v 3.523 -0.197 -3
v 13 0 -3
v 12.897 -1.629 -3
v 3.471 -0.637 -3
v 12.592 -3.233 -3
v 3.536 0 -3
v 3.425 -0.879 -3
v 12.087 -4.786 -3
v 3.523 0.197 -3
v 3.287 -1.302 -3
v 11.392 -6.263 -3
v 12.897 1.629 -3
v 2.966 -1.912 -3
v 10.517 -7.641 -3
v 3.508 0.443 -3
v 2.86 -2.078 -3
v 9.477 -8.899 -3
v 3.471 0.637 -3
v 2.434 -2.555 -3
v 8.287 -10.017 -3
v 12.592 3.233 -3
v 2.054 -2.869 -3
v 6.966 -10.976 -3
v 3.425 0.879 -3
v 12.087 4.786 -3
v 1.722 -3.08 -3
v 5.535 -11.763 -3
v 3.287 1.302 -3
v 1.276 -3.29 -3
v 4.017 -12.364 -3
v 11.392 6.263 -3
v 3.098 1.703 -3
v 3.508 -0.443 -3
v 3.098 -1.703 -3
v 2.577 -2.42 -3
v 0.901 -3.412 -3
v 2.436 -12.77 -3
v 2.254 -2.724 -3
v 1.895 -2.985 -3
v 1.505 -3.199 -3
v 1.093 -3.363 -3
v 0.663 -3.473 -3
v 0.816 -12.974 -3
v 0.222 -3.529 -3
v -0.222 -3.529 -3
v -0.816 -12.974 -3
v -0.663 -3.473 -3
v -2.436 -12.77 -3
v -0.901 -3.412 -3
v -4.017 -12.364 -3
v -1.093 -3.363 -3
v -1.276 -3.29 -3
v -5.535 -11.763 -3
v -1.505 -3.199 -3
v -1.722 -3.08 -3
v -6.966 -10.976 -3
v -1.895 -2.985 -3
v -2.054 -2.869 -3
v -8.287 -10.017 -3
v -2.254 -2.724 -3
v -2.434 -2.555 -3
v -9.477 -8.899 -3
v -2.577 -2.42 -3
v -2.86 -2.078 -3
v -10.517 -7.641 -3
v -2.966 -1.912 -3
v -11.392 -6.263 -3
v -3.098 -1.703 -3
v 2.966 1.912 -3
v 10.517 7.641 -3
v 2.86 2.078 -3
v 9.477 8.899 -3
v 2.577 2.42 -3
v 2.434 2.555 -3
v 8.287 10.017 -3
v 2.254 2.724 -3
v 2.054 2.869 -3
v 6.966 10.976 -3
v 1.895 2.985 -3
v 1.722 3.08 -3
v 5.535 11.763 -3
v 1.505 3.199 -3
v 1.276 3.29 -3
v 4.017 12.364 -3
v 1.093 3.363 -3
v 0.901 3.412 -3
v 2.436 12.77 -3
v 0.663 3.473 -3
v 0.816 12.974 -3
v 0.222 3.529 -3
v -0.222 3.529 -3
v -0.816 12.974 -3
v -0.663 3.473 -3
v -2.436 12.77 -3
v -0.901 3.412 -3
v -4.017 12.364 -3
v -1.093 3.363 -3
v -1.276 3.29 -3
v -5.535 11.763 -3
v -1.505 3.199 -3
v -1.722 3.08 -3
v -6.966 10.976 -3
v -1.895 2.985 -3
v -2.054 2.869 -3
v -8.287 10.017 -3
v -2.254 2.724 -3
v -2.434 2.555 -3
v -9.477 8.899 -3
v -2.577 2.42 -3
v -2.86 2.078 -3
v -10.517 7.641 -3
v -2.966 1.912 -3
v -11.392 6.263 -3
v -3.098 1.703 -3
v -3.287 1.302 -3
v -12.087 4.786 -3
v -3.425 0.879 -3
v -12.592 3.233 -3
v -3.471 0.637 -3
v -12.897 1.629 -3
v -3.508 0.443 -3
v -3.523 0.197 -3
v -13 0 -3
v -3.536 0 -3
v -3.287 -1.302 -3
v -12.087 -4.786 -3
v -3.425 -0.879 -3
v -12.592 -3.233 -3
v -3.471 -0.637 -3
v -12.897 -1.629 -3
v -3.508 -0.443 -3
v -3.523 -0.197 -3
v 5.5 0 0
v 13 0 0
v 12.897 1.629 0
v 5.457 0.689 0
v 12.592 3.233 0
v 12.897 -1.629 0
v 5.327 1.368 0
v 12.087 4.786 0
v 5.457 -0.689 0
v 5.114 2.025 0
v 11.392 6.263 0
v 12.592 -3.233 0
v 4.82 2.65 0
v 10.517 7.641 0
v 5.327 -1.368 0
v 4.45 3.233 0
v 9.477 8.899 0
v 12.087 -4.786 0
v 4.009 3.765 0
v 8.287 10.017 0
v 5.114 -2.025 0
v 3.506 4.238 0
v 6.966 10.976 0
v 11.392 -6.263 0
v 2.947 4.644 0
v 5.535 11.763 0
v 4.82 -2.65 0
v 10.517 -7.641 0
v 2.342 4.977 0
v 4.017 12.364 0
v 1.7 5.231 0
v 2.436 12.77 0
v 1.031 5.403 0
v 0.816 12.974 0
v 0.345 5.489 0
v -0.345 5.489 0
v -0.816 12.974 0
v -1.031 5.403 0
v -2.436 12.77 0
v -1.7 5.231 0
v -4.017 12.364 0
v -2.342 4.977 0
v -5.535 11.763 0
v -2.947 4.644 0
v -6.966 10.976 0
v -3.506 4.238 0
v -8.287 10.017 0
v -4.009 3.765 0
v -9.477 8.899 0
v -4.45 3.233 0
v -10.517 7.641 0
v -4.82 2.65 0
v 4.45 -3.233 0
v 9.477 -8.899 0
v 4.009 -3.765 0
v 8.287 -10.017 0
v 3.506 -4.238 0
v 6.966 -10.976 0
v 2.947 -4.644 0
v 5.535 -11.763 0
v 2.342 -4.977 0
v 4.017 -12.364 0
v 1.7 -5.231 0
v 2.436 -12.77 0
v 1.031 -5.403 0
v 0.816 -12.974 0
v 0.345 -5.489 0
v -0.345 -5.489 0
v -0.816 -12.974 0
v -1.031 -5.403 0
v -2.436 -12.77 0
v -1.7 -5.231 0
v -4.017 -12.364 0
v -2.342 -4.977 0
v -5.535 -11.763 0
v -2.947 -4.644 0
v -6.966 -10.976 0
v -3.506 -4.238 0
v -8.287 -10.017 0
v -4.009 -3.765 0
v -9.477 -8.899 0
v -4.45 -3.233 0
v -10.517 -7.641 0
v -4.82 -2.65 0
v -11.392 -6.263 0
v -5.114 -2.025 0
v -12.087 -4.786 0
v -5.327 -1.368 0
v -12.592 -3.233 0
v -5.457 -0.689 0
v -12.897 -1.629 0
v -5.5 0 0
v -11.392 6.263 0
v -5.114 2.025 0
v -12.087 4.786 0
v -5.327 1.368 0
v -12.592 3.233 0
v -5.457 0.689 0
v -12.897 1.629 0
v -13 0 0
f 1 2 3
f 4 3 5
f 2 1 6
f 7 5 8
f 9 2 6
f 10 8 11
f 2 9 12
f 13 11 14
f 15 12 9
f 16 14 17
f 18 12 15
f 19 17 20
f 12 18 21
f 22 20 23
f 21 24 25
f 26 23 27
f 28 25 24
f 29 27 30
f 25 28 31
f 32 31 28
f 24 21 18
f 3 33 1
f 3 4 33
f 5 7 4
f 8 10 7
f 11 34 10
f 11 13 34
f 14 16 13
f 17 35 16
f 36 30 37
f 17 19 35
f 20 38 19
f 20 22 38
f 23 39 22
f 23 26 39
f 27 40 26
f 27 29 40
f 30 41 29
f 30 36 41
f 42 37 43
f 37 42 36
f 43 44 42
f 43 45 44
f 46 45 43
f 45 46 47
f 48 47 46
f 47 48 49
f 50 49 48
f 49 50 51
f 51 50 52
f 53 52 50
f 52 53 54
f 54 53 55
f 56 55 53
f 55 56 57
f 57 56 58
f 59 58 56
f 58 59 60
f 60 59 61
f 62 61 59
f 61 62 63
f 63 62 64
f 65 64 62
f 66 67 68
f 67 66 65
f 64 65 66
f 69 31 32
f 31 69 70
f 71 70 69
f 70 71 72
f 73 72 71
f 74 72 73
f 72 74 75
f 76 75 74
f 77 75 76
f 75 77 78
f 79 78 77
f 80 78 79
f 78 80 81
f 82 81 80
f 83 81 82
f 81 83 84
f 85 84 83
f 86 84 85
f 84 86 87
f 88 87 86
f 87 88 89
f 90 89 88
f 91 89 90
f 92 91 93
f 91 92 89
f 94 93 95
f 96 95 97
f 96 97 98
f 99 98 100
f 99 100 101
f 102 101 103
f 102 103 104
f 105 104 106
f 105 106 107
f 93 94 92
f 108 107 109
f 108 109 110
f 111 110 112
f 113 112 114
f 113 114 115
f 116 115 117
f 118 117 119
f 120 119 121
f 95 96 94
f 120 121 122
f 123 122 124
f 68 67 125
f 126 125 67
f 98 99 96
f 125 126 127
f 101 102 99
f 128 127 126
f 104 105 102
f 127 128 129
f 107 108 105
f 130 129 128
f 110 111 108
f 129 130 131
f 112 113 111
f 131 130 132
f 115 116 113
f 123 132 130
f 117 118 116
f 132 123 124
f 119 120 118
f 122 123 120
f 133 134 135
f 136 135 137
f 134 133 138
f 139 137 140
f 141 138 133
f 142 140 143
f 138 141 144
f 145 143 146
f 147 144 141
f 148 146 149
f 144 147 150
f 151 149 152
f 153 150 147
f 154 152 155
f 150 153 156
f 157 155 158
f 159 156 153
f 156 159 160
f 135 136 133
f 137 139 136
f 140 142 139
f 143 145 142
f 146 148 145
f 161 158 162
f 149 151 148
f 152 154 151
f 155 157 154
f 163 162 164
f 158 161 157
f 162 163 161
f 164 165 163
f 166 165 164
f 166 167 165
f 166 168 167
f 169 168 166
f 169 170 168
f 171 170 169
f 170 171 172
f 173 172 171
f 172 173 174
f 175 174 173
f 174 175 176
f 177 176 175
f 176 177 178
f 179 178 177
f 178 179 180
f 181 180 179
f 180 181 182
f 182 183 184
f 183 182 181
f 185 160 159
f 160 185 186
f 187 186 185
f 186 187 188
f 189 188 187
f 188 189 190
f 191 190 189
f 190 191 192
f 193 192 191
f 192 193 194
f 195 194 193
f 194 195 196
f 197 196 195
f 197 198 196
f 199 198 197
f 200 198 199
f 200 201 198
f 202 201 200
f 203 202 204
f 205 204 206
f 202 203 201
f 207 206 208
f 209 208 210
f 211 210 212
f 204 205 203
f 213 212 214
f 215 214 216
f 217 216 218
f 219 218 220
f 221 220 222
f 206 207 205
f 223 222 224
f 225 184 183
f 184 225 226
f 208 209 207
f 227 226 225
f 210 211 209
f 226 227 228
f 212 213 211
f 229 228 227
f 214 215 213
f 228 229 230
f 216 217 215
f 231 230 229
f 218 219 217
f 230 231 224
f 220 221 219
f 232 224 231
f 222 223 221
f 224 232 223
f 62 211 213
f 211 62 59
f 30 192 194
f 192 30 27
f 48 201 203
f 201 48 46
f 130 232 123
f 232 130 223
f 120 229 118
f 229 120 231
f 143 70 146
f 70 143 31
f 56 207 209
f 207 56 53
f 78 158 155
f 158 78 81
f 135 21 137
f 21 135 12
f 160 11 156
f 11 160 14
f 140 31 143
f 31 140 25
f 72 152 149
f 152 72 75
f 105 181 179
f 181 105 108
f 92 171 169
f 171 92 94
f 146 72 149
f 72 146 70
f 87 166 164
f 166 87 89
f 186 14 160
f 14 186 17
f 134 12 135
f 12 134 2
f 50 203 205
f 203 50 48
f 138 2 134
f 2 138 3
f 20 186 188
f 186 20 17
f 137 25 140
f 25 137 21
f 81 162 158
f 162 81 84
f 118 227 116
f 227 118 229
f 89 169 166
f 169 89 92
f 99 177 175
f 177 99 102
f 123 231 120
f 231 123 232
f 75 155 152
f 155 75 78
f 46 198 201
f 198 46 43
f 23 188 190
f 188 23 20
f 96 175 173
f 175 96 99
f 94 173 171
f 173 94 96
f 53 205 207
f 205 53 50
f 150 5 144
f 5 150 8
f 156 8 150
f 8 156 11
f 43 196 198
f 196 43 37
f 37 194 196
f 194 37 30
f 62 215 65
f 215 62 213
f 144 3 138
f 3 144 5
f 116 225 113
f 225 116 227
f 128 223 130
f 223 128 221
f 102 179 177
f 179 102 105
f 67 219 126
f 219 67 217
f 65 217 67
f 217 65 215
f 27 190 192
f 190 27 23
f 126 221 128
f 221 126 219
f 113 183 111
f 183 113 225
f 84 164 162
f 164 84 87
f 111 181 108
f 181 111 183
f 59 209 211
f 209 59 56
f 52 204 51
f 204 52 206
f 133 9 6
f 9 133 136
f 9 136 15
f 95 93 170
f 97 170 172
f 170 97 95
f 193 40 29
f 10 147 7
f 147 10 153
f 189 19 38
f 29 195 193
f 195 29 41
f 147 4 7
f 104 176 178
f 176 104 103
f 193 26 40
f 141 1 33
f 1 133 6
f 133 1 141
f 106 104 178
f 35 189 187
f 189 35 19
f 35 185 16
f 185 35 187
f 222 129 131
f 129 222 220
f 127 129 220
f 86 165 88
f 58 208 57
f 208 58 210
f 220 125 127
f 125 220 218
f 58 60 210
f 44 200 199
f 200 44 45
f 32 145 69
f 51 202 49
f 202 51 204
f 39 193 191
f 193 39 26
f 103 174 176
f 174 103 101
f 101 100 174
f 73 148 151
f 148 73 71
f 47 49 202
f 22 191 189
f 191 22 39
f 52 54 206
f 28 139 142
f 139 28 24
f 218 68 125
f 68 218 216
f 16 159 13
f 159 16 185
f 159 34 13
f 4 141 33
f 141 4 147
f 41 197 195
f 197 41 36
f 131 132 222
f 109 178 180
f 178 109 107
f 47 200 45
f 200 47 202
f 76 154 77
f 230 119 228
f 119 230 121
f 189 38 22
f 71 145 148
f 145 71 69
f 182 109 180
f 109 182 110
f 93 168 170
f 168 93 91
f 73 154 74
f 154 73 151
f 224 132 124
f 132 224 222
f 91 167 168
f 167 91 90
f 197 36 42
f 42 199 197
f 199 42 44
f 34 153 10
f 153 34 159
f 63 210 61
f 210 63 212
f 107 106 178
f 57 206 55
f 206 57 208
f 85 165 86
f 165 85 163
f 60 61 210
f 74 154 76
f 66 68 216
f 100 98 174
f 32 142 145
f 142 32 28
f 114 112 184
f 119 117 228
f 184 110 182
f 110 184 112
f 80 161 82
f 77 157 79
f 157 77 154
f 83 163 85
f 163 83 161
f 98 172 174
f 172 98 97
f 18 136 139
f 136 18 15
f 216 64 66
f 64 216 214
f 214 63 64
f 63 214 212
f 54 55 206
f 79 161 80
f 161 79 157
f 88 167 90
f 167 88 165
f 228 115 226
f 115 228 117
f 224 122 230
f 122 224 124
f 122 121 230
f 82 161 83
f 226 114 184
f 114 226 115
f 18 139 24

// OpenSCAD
$fn = 50;


difference() {
	union() {
		translate(v = [0, 0, -3.0000000000]) {
			cylinder(h = 3, r = 7.0000000000);
		}
		translate(v = [0, 0, -3.0000000000]) {
			cylinder(h = 3, r = 13.0000000000);
		}
	}
	union() {
		translate(v = [0, 0, 0]) {
			rotate(a = [0, 0, 0]) {
				difference() {
					union() {
						#translate(v = [0, 0, -3.0000000000]) {
							cylinder(h = 3, r = 2.2500000000);
						}
						#translate(v = [0, 0, -4.2000000000]) {
							cylinder(h = 4.2000000000, r = 7.0000000000, r1 = 2.7500000000, r2 = 5.5000000000);
						}
						#translate(v = [0, 0, -3.0000000000]) {
							cylinder(h = 3, r = 2.7500000000);
						}
						#translate(v = [0, 0, -3.0000000000]) {
							cylinder(h = 3, r = 2.2500000000);
						}
					}
					union();
				}
			}
		}
	}
}
